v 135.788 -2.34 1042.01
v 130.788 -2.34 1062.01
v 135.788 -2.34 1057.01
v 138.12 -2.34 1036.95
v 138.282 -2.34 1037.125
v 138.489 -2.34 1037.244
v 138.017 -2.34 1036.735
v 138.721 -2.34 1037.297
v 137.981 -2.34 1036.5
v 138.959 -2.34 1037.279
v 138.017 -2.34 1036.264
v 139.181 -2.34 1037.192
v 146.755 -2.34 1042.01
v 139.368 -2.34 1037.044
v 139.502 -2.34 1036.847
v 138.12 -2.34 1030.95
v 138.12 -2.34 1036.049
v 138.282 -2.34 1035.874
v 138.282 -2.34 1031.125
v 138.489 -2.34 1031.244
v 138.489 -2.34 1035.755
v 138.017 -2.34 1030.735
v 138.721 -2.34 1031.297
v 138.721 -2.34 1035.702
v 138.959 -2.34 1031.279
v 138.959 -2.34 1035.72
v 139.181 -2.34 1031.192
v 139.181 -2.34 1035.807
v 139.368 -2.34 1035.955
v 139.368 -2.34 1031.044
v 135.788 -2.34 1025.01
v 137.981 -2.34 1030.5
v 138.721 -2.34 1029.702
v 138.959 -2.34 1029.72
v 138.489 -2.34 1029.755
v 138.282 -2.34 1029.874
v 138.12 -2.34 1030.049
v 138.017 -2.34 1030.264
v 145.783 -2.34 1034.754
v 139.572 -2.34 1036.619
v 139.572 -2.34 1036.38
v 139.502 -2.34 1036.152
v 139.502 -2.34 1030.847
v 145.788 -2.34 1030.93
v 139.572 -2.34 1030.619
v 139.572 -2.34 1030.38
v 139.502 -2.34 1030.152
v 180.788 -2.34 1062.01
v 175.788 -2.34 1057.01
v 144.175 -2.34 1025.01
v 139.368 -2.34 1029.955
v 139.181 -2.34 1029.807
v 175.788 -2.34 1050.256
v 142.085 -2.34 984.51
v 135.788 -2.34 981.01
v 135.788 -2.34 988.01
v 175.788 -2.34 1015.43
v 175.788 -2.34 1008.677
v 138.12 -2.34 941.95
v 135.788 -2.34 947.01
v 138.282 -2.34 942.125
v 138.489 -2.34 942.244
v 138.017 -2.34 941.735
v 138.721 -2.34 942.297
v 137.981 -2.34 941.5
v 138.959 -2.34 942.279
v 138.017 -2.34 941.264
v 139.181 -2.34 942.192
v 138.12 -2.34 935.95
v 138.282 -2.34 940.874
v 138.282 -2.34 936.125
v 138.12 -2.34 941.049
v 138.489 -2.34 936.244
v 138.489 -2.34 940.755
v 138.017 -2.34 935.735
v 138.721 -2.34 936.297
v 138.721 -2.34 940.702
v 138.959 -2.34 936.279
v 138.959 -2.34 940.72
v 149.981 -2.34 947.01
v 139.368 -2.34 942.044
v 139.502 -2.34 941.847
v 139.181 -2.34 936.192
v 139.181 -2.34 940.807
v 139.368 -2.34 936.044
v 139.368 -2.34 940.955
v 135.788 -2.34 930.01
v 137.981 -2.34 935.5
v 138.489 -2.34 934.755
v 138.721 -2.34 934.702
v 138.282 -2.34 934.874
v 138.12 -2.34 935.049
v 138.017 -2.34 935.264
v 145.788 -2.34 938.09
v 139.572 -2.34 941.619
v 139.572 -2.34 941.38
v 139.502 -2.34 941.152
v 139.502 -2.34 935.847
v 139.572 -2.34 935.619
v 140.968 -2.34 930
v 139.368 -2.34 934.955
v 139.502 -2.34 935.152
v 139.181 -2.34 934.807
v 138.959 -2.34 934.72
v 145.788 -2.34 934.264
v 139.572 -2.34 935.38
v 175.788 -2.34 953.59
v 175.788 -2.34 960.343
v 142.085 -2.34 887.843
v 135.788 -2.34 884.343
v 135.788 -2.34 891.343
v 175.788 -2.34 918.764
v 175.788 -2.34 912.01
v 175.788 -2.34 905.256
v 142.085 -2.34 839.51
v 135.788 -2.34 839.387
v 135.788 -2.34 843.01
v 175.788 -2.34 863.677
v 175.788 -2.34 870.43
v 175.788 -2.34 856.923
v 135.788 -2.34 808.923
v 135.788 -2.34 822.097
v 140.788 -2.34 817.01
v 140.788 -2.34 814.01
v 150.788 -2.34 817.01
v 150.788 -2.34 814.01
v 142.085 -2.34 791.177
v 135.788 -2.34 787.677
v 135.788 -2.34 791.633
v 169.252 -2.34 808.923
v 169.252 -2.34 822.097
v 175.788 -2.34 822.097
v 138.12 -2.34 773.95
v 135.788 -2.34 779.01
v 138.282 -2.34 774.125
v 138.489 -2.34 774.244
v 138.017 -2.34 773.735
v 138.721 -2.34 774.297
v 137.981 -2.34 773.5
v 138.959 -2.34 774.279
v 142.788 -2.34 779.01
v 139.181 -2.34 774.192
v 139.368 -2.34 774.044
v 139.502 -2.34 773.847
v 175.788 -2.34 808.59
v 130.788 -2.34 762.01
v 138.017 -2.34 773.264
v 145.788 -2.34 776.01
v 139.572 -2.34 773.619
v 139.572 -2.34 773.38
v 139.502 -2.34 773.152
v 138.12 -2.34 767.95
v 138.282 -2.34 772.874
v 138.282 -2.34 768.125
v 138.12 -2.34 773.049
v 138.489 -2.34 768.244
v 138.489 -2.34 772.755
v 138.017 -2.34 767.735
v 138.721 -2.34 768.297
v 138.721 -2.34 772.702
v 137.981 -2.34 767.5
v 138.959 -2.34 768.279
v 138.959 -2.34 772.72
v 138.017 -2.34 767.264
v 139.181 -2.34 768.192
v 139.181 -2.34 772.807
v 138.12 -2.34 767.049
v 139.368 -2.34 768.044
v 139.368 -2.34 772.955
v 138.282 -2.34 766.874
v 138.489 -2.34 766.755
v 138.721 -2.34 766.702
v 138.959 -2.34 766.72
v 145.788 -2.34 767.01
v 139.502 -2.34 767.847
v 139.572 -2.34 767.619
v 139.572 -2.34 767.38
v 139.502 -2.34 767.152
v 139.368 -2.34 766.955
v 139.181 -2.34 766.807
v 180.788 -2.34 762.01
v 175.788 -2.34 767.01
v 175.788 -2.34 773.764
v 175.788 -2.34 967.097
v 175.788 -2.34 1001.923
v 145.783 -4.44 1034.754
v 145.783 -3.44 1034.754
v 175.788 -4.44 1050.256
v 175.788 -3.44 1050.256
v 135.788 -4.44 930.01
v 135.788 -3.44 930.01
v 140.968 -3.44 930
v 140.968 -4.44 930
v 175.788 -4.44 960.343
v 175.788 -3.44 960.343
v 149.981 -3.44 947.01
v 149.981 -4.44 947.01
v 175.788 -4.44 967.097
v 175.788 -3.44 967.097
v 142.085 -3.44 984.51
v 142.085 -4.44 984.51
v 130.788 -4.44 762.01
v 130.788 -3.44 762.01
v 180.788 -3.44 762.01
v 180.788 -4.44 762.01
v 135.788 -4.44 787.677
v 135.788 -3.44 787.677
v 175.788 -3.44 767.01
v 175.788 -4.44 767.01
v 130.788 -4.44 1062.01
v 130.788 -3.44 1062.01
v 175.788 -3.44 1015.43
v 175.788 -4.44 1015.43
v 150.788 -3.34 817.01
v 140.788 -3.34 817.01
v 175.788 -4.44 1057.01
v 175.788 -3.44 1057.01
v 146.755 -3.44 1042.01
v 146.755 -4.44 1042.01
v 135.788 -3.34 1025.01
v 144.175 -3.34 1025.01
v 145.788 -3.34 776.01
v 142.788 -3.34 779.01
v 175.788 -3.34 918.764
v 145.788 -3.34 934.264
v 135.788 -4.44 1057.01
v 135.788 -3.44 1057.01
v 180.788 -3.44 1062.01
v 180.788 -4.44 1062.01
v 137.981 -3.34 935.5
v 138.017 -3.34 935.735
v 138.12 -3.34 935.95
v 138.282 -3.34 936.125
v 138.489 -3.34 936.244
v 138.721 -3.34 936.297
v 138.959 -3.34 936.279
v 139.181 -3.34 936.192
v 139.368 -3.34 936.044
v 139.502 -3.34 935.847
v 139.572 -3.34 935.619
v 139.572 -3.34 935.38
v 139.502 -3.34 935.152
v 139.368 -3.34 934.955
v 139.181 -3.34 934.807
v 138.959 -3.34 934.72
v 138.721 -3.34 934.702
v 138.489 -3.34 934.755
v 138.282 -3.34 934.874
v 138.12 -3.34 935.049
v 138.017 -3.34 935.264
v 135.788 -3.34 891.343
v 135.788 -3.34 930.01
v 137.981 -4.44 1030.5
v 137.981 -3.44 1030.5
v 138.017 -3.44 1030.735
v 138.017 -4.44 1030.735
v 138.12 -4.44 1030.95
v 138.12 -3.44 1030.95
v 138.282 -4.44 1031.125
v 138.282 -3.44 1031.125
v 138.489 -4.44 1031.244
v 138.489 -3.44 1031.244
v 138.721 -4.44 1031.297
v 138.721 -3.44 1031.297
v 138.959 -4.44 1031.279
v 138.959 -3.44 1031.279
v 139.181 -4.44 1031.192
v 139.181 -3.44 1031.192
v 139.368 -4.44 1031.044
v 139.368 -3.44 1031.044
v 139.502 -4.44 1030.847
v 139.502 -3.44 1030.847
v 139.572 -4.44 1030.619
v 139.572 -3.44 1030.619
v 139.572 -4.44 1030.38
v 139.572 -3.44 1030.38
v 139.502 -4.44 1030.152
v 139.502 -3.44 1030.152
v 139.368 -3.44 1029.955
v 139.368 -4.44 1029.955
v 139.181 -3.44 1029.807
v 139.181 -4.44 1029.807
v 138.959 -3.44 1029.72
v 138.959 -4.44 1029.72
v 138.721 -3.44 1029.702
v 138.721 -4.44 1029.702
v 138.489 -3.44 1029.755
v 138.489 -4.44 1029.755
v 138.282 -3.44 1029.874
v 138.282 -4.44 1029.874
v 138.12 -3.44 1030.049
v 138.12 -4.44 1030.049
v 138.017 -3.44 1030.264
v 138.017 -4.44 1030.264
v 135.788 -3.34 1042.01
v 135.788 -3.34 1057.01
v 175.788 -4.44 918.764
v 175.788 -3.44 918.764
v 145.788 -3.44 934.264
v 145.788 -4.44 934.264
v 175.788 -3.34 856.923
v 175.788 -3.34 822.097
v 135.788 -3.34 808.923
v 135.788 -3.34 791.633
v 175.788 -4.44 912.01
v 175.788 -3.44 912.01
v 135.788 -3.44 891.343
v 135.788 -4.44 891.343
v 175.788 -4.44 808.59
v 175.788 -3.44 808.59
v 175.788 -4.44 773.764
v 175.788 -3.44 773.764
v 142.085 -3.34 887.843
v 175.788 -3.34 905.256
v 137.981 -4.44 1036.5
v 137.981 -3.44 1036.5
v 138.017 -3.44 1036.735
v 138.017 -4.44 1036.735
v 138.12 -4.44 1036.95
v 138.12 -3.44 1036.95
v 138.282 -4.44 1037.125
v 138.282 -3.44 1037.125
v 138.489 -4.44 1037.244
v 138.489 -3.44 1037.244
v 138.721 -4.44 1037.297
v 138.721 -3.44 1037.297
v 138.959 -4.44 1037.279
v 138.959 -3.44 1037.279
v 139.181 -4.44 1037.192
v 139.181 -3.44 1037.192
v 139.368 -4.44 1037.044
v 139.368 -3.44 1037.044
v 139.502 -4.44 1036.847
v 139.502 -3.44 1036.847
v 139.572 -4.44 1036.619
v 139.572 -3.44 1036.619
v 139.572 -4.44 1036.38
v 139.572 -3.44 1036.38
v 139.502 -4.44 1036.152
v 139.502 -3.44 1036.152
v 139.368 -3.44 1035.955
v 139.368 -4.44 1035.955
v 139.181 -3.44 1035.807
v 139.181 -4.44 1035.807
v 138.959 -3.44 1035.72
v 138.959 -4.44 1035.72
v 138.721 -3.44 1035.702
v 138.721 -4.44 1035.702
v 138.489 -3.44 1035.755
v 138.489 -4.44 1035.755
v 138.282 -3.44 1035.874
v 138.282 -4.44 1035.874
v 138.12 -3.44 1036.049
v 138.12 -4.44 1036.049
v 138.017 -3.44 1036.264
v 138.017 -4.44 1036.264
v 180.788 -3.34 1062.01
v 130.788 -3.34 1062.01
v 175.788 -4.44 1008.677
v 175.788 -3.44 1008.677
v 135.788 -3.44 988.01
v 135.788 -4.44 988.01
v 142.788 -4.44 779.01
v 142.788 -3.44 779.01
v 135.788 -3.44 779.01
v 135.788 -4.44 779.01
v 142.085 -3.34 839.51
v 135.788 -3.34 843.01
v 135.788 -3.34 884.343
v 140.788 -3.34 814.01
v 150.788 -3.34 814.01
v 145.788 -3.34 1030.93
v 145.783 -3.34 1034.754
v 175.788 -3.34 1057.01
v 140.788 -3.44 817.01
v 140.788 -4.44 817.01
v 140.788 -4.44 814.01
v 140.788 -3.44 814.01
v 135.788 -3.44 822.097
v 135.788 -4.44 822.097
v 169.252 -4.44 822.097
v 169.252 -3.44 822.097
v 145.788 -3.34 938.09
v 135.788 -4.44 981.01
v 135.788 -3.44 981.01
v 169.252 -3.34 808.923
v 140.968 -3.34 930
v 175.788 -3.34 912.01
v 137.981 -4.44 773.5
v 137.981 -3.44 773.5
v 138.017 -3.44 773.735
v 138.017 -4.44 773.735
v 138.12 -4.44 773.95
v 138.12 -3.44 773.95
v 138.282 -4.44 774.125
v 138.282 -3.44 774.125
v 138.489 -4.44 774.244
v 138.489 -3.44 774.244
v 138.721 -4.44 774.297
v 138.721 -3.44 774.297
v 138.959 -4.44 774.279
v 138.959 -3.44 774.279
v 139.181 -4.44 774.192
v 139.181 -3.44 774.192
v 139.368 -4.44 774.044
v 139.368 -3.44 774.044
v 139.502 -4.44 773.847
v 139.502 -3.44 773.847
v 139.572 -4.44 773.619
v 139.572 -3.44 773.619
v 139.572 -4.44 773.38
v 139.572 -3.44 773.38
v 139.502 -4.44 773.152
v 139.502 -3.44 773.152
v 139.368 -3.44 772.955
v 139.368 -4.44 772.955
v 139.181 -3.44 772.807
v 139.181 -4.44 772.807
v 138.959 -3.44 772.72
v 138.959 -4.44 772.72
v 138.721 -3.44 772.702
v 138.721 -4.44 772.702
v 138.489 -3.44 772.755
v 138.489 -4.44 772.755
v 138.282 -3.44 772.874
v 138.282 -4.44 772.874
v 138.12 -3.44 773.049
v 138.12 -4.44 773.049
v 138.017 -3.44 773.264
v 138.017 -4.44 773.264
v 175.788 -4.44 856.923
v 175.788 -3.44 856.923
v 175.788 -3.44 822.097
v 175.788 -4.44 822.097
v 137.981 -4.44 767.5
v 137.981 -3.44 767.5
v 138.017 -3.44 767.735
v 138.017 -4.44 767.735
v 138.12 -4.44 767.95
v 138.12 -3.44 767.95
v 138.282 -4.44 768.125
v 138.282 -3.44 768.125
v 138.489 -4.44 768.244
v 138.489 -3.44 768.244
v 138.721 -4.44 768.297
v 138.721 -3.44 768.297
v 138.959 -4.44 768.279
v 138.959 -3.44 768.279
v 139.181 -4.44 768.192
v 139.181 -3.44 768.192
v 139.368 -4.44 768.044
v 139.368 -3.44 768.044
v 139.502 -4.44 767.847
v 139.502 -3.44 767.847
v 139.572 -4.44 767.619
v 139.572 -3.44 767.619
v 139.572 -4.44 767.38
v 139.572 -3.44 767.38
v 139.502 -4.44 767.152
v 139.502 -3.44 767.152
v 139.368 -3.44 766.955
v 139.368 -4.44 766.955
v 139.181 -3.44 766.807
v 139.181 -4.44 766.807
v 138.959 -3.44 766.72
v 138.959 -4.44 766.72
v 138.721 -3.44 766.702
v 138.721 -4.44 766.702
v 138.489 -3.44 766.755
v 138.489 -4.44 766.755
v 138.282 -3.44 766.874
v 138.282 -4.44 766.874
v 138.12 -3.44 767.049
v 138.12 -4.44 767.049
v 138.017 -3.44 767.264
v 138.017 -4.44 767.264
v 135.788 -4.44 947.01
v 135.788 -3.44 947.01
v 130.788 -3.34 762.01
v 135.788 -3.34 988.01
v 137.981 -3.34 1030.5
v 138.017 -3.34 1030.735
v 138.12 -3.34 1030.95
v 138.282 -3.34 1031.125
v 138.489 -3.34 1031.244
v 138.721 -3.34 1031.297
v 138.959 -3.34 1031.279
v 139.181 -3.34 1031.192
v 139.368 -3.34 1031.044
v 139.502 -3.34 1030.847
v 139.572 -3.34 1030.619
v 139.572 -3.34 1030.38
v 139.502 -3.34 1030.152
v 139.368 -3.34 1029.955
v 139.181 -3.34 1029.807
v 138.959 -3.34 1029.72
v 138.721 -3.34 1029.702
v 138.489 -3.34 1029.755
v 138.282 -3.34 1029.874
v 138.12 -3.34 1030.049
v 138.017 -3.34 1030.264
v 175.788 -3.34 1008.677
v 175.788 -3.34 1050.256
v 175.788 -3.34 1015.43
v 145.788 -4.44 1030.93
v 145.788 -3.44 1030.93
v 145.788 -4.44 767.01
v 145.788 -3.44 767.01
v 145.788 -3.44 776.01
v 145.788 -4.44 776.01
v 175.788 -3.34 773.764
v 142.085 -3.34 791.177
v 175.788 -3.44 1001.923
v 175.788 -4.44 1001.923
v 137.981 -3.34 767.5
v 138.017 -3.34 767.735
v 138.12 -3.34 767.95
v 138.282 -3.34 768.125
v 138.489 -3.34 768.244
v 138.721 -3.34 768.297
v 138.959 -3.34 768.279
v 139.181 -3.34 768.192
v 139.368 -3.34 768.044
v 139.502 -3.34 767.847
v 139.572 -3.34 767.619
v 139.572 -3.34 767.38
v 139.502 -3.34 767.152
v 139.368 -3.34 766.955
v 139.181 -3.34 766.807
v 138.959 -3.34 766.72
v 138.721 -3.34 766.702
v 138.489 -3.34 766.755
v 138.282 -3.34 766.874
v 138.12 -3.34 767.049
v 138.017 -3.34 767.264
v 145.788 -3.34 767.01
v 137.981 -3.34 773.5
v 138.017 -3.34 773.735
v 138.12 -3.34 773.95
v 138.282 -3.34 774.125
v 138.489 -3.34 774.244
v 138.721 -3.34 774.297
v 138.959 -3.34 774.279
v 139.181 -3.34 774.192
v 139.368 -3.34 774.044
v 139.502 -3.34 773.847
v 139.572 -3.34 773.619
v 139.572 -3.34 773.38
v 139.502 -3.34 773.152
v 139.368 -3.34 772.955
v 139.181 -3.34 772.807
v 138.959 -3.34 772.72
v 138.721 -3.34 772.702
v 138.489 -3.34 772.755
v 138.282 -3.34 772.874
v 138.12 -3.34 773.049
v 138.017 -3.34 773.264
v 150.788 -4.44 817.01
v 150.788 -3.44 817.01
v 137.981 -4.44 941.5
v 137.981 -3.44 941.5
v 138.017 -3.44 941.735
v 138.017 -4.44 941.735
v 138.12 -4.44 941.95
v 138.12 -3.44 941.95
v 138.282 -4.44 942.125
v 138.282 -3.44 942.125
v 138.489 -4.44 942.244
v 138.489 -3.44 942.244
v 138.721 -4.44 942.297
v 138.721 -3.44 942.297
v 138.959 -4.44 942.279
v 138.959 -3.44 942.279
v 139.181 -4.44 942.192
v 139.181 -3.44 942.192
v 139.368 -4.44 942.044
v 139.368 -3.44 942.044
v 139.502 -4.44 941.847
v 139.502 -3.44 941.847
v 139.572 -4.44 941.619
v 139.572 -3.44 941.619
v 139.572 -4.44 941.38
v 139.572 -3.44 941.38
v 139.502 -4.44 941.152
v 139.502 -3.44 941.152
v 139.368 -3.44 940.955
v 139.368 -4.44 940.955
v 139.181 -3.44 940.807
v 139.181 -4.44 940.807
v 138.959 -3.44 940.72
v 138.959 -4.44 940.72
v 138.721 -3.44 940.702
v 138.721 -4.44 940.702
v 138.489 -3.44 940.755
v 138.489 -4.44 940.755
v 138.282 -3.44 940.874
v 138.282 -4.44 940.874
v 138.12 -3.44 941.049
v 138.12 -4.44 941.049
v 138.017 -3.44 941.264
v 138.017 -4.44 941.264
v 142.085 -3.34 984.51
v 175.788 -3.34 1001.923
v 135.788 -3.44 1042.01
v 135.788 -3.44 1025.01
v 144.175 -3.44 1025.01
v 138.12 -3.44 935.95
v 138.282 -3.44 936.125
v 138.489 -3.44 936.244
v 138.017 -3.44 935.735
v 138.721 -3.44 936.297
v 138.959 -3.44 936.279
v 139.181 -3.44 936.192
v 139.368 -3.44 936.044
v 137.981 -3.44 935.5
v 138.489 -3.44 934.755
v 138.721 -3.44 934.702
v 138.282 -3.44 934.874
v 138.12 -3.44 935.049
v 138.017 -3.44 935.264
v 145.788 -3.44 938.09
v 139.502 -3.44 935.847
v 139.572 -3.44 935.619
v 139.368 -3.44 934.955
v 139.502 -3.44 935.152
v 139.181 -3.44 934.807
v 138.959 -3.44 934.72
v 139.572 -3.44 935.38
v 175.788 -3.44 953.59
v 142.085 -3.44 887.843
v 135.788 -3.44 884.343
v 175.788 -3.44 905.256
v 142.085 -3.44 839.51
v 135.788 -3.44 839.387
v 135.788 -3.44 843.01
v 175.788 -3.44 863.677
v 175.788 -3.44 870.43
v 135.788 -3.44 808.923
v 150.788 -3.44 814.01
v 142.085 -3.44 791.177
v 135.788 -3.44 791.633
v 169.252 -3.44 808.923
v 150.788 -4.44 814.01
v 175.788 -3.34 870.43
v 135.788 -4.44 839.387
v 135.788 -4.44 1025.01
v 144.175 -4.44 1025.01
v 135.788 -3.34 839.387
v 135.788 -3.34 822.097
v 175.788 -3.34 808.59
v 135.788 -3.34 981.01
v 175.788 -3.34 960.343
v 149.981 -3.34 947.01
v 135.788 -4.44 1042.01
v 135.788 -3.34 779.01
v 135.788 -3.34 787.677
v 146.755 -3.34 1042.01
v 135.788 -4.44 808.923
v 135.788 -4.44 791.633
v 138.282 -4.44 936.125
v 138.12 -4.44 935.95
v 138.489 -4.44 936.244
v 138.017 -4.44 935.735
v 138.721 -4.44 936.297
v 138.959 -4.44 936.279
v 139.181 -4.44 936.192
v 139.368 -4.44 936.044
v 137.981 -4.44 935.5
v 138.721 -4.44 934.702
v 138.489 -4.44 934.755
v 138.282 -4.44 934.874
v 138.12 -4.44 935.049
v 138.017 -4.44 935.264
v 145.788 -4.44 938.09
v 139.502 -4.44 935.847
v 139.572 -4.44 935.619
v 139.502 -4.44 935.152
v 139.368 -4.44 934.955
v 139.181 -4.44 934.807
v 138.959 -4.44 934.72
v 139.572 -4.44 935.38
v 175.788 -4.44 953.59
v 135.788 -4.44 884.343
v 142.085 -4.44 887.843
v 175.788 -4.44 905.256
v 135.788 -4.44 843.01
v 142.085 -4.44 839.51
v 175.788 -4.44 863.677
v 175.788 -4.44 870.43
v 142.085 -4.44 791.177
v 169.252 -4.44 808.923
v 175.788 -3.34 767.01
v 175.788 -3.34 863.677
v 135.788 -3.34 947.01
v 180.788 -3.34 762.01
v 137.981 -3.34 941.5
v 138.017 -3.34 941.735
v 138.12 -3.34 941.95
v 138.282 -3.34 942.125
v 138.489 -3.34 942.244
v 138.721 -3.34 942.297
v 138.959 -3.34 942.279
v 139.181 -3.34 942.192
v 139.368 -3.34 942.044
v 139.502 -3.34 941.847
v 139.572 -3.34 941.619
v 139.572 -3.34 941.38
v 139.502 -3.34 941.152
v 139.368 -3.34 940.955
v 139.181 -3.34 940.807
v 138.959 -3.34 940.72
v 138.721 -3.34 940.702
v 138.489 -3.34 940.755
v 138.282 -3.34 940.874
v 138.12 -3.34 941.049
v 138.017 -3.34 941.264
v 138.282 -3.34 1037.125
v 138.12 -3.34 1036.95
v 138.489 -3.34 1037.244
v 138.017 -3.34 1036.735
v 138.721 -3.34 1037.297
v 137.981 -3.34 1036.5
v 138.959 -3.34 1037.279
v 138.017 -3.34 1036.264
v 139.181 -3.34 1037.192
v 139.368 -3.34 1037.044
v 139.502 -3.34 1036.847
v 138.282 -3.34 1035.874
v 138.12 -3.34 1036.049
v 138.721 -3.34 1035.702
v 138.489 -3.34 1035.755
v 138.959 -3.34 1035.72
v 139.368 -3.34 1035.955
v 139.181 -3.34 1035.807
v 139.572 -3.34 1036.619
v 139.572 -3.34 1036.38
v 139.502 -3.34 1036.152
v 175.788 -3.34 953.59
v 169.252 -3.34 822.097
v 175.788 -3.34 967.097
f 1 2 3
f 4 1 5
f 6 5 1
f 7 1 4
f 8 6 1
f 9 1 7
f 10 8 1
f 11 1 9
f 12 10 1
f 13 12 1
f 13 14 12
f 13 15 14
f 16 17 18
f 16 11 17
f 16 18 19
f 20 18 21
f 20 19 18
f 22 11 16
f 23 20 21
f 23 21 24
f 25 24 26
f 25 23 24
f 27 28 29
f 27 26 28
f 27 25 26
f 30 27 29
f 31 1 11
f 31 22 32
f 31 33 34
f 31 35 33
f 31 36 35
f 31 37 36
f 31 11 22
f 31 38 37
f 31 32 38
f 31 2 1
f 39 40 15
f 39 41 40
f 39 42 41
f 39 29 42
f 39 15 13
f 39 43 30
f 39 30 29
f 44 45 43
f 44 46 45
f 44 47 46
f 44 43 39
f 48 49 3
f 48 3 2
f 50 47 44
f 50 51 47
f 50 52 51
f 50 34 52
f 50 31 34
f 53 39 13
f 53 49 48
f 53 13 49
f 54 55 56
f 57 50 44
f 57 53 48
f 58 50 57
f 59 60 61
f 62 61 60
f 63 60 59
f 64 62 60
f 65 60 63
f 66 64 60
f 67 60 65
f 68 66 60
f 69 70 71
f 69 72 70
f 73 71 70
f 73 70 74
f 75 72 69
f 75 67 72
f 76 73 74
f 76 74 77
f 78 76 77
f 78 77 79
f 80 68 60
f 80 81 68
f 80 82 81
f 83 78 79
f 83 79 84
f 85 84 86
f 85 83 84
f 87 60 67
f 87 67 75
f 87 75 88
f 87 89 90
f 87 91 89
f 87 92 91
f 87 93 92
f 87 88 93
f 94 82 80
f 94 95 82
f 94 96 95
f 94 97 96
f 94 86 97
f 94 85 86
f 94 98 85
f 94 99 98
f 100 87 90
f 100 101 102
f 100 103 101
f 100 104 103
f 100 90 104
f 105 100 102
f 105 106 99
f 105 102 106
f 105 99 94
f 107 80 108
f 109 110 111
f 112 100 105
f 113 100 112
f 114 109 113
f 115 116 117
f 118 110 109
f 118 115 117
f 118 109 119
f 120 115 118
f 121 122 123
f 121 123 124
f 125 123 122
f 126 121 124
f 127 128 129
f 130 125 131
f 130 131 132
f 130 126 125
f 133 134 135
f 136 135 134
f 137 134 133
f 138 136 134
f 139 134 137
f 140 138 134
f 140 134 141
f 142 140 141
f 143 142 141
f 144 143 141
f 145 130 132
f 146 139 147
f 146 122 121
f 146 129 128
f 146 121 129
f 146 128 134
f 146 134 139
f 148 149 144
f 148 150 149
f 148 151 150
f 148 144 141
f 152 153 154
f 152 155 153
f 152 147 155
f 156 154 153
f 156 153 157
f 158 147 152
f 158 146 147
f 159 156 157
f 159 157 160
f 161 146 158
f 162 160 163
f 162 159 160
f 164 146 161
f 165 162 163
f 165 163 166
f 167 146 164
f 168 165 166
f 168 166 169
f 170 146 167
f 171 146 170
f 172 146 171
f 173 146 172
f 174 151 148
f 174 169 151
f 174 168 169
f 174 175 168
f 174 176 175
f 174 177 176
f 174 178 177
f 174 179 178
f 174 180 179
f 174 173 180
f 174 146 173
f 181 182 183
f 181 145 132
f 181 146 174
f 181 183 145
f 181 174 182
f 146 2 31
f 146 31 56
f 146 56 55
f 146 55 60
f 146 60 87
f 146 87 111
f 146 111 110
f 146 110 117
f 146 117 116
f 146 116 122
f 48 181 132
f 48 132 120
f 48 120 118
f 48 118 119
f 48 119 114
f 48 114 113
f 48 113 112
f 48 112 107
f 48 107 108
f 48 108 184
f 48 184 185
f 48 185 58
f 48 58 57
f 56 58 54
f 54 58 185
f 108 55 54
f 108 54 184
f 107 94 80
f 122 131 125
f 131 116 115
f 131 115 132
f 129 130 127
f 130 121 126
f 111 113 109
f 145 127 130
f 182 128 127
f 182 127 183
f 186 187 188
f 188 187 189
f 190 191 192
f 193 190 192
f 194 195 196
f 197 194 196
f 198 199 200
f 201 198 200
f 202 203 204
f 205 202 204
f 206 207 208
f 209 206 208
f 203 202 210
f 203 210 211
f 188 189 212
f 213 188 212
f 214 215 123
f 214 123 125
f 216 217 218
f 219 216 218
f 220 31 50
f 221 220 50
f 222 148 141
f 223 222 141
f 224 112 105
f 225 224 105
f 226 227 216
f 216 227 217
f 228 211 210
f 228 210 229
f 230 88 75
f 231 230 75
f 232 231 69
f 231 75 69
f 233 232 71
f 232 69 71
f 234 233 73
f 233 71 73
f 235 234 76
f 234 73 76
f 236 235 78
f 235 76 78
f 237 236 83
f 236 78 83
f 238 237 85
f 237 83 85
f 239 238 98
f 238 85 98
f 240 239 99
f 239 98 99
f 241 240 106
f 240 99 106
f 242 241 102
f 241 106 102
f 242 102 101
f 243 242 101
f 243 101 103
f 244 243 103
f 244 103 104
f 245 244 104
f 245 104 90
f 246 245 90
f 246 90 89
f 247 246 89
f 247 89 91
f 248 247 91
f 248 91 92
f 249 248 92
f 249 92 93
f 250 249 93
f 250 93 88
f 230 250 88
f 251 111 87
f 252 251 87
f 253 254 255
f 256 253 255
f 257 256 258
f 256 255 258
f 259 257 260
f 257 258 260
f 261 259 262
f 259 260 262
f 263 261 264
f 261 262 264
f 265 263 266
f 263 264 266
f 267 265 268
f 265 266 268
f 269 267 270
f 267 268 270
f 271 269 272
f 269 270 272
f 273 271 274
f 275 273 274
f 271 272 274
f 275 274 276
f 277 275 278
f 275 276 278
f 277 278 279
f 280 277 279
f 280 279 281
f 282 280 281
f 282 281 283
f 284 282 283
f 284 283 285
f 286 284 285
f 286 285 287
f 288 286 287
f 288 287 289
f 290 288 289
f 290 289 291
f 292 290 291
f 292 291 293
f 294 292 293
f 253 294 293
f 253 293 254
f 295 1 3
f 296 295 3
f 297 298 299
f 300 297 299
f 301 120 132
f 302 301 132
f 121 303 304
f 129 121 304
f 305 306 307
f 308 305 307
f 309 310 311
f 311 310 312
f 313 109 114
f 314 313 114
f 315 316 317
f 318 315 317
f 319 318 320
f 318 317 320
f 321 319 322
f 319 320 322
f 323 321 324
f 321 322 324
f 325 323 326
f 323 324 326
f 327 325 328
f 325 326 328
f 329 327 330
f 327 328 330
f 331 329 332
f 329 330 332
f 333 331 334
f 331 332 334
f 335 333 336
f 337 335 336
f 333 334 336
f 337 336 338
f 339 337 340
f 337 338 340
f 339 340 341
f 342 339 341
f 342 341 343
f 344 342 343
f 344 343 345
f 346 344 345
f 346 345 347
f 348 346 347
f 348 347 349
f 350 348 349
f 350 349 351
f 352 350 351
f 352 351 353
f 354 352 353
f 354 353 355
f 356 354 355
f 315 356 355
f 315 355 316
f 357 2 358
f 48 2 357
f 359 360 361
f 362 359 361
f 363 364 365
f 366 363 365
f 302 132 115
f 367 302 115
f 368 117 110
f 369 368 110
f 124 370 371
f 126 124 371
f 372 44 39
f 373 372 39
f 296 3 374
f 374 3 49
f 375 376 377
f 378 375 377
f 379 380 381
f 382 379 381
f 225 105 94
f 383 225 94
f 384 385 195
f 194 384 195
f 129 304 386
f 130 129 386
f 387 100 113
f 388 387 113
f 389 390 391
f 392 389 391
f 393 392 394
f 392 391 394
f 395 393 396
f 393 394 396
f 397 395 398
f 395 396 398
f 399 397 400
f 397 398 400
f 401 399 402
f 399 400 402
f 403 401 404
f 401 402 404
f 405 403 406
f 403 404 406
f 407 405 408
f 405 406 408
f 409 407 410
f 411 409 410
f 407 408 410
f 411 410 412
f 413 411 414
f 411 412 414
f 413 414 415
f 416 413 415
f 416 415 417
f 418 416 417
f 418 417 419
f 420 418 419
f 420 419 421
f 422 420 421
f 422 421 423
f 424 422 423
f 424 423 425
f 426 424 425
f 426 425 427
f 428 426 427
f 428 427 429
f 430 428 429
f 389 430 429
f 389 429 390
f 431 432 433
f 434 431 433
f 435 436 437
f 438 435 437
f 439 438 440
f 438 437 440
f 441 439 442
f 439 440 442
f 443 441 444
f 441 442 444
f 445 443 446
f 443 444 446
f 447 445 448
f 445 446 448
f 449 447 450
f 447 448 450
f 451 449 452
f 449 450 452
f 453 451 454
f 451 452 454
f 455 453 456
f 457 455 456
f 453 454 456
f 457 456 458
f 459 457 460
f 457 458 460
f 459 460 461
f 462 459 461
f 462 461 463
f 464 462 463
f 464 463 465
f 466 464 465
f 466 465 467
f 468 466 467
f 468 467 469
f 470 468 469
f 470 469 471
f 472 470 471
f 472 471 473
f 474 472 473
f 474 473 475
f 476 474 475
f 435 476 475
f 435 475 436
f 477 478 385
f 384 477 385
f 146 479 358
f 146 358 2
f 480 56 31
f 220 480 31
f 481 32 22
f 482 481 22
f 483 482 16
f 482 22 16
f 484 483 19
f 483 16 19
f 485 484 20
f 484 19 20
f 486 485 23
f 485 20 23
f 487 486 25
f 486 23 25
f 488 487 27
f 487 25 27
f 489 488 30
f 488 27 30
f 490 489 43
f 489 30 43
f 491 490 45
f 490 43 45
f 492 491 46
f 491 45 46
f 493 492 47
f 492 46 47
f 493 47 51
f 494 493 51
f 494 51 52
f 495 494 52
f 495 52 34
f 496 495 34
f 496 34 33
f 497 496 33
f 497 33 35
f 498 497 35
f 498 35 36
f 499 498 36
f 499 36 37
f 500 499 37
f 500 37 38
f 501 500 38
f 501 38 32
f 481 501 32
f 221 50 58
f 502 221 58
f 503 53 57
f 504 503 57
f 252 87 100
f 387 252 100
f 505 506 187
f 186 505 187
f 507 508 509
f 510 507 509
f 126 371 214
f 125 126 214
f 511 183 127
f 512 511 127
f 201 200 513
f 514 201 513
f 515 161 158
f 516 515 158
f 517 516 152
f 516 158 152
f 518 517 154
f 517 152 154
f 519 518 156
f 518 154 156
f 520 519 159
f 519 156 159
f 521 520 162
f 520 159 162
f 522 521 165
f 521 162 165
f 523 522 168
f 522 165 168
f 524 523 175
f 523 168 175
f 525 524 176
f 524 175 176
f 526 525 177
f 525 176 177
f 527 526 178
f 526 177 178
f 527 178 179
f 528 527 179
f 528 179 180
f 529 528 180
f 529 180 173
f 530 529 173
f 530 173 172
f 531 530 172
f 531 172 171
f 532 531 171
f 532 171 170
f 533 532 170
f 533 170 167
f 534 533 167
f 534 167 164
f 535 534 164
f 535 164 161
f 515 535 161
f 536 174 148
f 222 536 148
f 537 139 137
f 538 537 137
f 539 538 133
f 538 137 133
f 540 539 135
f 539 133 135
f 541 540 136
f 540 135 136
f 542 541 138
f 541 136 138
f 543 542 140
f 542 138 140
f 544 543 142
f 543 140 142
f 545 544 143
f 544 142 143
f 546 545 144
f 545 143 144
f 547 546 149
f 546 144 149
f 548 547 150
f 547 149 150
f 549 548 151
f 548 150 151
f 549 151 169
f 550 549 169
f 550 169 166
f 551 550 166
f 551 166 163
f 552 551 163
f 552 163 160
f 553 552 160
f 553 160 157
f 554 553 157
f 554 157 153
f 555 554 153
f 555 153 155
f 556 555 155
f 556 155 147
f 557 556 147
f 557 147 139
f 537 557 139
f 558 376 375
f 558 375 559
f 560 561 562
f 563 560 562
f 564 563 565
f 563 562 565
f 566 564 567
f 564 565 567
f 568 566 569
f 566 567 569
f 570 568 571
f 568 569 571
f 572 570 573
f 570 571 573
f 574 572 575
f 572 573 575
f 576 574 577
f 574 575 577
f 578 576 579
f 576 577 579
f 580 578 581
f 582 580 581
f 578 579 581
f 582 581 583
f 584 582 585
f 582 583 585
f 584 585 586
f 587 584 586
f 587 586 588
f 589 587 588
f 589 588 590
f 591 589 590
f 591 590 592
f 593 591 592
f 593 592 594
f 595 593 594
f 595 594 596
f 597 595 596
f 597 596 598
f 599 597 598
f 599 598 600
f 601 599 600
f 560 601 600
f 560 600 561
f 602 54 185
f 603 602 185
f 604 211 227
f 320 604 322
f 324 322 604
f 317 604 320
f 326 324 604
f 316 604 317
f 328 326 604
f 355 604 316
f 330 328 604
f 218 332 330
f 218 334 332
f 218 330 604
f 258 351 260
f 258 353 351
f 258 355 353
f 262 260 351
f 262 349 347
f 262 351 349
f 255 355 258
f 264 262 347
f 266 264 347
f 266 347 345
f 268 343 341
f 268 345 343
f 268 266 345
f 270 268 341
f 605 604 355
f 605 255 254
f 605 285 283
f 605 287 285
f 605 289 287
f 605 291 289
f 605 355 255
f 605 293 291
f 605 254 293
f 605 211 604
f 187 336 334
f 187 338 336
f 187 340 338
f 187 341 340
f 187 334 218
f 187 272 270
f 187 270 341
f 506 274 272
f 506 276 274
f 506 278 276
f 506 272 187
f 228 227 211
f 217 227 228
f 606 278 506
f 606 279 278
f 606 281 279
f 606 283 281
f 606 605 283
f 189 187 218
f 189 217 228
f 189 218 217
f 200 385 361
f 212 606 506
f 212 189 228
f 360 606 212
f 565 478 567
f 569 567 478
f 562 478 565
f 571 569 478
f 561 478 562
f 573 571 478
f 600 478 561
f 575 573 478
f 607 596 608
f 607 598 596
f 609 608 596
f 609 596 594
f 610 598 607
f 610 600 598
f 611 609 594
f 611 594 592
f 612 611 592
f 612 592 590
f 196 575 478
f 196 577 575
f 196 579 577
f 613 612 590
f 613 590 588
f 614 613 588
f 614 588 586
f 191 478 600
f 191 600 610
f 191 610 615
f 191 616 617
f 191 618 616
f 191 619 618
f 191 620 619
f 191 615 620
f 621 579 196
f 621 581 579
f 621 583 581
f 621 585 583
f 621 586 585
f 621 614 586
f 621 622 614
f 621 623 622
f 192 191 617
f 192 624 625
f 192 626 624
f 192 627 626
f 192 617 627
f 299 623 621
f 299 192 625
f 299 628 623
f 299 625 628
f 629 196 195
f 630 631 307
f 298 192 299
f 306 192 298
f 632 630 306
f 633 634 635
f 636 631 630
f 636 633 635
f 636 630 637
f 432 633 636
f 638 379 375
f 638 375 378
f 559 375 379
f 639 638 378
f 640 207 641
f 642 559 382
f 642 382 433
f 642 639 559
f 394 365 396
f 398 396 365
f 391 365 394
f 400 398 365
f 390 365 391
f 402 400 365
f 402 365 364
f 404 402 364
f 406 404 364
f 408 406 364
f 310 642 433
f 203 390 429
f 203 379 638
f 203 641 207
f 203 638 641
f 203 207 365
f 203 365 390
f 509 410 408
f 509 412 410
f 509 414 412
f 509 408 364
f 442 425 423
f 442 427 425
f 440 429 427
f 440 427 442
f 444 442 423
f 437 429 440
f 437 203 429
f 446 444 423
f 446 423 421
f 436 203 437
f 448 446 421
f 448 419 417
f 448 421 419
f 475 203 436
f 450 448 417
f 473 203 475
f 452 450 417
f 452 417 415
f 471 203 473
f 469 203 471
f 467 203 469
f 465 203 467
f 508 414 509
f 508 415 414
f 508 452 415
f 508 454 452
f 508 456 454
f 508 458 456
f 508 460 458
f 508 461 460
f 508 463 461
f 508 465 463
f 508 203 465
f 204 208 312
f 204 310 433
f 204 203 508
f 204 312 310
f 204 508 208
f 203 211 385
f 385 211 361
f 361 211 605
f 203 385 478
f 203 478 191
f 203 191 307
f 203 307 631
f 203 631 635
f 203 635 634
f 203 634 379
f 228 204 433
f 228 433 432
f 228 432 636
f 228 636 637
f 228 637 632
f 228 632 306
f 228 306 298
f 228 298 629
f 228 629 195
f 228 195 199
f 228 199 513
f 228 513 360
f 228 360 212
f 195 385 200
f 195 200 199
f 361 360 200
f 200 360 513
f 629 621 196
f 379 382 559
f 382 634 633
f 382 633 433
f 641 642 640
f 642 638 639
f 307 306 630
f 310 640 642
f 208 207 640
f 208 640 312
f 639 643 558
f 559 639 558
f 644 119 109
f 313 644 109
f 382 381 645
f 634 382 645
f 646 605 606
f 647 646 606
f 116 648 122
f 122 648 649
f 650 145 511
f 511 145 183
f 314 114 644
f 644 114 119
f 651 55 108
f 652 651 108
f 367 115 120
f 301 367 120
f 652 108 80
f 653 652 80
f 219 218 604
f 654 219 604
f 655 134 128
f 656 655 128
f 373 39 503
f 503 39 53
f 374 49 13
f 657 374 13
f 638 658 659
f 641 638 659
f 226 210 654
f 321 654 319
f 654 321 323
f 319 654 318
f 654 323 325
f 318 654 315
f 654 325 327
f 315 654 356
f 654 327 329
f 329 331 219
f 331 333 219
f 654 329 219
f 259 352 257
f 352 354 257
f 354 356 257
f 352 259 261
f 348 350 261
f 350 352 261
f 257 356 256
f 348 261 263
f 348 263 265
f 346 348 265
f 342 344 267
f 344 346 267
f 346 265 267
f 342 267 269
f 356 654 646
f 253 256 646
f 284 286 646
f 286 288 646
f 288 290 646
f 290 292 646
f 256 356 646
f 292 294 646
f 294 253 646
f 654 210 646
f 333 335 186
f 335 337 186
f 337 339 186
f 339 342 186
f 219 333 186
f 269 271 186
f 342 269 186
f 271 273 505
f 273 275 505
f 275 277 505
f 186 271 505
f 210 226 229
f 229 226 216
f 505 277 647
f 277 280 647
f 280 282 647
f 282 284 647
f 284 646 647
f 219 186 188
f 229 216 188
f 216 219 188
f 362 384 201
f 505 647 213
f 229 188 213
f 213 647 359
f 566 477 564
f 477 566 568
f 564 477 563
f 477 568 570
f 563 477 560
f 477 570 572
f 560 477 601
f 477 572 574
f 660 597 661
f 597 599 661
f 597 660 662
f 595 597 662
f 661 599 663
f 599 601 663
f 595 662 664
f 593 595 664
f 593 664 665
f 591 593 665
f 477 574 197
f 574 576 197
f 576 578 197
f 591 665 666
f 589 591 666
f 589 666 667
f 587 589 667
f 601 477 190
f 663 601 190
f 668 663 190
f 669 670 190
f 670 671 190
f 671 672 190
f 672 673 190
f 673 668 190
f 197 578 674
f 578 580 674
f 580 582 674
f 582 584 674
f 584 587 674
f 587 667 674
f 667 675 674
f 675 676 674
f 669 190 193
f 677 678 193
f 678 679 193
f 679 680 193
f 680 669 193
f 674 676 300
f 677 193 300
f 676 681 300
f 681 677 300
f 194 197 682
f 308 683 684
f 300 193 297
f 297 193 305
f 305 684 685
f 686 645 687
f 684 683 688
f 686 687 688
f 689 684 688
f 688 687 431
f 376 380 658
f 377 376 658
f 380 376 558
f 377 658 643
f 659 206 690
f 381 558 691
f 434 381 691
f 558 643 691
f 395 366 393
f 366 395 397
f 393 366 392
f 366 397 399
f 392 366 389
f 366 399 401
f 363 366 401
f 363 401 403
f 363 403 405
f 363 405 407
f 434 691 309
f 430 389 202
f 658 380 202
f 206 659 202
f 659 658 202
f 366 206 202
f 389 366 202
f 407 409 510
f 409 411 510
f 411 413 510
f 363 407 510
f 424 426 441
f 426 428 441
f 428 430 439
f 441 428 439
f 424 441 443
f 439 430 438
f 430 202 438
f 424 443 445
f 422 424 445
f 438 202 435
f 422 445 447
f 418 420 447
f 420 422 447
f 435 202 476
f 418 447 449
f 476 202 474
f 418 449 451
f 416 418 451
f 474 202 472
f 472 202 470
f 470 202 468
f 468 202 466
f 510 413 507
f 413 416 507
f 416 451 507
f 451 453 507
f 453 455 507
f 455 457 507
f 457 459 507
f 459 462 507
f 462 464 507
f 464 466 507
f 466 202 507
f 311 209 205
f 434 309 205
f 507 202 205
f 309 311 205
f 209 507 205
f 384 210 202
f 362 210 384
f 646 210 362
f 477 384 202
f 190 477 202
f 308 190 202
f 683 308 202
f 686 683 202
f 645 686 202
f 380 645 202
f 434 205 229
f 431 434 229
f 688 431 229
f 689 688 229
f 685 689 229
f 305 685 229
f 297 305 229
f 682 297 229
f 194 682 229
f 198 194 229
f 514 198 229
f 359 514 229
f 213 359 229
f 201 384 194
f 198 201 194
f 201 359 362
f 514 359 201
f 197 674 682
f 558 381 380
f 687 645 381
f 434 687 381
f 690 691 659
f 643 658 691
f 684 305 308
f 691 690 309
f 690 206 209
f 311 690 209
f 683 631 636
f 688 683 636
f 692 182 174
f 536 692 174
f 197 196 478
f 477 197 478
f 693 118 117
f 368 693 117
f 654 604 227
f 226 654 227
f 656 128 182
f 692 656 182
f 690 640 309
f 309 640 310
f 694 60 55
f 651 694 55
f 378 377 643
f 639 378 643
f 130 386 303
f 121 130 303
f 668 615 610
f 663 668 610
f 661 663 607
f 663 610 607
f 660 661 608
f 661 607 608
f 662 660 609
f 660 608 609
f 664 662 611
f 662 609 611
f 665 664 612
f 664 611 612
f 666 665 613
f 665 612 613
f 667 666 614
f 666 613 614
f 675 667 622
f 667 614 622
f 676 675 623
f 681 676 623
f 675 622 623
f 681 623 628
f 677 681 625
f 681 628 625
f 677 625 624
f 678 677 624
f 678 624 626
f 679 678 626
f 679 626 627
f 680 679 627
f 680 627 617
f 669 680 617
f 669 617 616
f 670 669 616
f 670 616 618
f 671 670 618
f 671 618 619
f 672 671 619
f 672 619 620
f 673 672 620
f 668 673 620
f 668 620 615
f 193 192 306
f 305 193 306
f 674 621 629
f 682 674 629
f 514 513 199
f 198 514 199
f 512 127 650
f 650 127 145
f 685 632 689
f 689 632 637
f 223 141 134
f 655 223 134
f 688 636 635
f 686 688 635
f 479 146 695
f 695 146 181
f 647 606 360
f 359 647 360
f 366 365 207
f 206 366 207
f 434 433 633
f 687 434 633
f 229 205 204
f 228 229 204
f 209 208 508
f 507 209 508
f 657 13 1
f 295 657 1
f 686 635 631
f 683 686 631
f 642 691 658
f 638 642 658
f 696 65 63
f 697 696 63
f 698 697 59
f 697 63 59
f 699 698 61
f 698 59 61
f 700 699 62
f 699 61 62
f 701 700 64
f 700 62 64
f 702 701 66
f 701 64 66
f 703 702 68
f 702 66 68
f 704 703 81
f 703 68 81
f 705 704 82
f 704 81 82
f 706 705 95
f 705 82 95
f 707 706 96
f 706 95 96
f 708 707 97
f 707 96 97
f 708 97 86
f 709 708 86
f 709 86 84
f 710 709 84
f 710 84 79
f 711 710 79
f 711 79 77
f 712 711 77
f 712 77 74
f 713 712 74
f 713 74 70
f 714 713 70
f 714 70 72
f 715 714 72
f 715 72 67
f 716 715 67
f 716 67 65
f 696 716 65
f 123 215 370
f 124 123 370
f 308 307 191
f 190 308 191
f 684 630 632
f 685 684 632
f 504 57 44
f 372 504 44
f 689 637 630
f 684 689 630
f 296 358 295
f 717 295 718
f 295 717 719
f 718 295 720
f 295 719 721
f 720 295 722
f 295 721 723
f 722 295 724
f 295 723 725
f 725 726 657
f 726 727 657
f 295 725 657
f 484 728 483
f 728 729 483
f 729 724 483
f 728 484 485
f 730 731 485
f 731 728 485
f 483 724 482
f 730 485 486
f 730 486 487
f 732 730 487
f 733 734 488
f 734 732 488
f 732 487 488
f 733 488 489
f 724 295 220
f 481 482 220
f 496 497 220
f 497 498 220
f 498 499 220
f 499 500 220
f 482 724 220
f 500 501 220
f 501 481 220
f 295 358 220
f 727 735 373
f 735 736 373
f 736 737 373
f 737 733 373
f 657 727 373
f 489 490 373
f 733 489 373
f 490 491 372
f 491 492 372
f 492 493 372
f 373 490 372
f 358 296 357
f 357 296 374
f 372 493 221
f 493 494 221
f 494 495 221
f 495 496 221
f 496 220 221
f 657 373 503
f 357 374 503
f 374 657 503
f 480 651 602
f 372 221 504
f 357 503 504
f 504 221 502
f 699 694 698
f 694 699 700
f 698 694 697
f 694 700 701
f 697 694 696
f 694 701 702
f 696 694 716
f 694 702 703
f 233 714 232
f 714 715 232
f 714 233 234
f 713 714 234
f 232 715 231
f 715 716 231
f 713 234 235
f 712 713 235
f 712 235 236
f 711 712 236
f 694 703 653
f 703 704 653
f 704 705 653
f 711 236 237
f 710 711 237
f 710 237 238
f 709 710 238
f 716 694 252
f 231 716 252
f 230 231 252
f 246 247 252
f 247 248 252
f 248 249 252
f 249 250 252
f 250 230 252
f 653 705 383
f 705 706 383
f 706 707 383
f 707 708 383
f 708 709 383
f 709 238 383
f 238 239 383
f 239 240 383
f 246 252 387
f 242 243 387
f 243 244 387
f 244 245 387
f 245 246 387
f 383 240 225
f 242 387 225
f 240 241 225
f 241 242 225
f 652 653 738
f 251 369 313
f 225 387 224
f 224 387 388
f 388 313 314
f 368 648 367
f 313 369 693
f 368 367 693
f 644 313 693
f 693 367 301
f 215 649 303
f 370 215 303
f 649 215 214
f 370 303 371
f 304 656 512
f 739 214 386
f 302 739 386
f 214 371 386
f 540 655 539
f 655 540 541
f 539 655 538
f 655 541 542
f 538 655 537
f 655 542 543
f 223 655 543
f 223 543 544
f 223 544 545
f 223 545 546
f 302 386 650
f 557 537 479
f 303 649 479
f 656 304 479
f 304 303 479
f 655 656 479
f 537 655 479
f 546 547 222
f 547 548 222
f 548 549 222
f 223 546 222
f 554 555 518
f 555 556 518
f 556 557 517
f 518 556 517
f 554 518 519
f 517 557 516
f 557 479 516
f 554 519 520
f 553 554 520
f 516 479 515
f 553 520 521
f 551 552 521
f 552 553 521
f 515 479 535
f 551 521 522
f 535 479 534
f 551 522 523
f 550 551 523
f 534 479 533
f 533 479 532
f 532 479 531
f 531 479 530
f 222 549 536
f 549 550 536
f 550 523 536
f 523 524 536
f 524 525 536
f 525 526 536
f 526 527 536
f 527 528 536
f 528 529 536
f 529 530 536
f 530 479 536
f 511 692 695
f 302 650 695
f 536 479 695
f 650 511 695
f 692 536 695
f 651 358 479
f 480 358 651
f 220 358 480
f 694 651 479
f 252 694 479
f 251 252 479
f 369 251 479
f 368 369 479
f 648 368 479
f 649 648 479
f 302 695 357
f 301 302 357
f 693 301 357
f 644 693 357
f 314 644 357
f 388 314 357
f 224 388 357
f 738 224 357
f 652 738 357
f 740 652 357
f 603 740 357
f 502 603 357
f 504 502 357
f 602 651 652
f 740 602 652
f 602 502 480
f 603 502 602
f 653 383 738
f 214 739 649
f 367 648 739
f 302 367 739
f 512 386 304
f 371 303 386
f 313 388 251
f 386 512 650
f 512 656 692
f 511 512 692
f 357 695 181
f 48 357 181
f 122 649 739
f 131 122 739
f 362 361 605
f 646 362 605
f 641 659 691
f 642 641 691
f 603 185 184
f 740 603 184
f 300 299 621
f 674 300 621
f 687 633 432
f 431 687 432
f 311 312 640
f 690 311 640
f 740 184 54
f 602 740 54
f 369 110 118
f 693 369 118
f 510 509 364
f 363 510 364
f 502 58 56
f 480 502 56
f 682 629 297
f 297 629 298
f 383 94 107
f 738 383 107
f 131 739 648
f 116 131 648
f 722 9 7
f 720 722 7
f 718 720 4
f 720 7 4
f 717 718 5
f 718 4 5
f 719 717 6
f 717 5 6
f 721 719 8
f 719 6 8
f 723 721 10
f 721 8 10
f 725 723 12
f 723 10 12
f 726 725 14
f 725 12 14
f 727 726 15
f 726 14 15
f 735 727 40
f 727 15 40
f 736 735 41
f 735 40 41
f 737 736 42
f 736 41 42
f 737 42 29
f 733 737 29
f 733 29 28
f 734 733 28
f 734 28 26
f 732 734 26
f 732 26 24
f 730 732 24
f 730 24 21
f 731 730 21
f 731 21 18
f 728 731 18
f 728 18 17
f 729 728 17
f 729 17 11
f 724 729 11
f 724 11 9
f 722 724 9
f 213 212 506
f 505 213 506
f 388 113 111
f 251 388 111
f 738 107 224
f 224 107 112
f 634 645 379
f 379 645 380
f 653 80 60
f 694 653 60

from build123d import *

# Parameters (mm, degrees)
SKETCH_2_W          = 50
SKETCH_2_H          = 1
EXTRUDE_1_DEPTH     = 300
EXTRUDE_1_2_DEPTH   = 300
CUT_EXTRUDE_1_DEPTH = 1078.290028257
SKETCH_4_W          = 10
SKETCH_4_H          = 1.5
CUT_EXTRUDE_2_DEPTH = 10
SKETCH_5_R          = 0.8
CUT_EXTRUDE_3_DEPTH = 1078.290028257


with BuildPart() as part:
    # 草图2 → 凸台-拉伸1 (new body)
    with BuildSketch(Plane.XY.offset(762.01)):
        with Locations((155.787596038, -2.839694097)):
            Rectangle(SKETCH_2_W, SKETCH_2_H)
    extrude(amount=EXTRUDE_1_DEPTH)


with BuildPart() as body_2:
    # 草图2 → Extrude 1 2 (new body)
    with BuildSketch(Plane.XY.offset(762.01)):
        with Locations((155.787596038, -3.939694097)):
            Rectangle(SKETCH_2_W, SKETCH_2_H)
    extrude(amount=EXTRUDE_1_2_DEPTH)


with BuildPart() as cut_extrude_1_tool:
    # 草图3 → 切除-拉伸1 (new, through all)
    with BuildSketch(Plane(origin=(0, -2.339694097, 0), x_dir=(1, 0, 0), z_dir=(0, 1, 0))):
        Polygon((135.787596038, -1057.01), (175.787596038, -1057.01), (146.755337973, -1042.01), (135.787596038, -1042.01), align=None)
        Polygon((145.783189251, -1034.754205558), (175.787596038, -1050.256482398), (175.787596038, -1015.430184269), (145.787596038, -1030.930184269), align=None)
        Polygon((144.174692812, -1025.01), (175.787596038, -1008.676666667), (135.787596038, -988.01), (135.787596038, -1025.01), align=None)
        Polygon((142.08472688, -984.51), (175.787596038, -1001.923149065), (175.787596038, -967.096850935), align=None)
        Polygon((135.787596038, -947.01), (135.787596038, -981.01), (175.787596038, -960.343333333), (149.981144425, -947.01), align=None)
        Polygon((145.787596038, -938.089815731), (175.787596038, -953.589815731), (175.787596038, -918.763517602), (145.787596038, -934.263517602), align=None)
        Polygon((140.968302675, -929.999968238), (175.787596038, -912.01), (135.787596038, -891.343333333), (135.787596038, -930.01), align=None)
        Polygon((142.08472688, -887.843333333), (175.787596038, -905.256482398), (175.787596038, -870.430184269), align=None)
        Polygon((135.787596038, -843.01), (135.787596038, -884.343333333), (175.787596038, -863.676666667), align=None)
        Polygon((142.08472688, -839.51), (175.787596038, -856.923149065), (175.787596038, -822.096850935), align=None)
        Polygon((135.787596038, -779.01), (135.787596038, -787.676666667), (175.787596038, -767.01), (145.787596038, -767.01), (145.787596038, -776.01), (142.787596038, -779.01), align=None)
        Polygon((142.08472688, -791.176666667), (175.787596038, -808.589815731), (175.787596038, -773.763517602), align=None)
    extrude(amount=-CUT_EXTRUDE_1_DEPTH)


with BuildPart() as part_1:
    add(part.part)

    # 切除-拉伸1: cut by cut_extrude_1_tool
    add(cut_extrude_1_tool.part, mode=Mode.SUBTRACT)


with BuildPart() as body_2_1:
    add(body_2.part)

    # 切除-拉伸1: cut by cut_extrude_1_tool
    add(cut_extrude_1_tool.part, mode=Mode.SUBTRACT)


with BuildPart() as cut_extrude_2_tool:
    # 草图4 → 切除-拉伸2 (new body)
    with BuildSketch(Plane.XZ.offset(4.439694097)):
        with Locations((145.787596038, 814.76)):
            Rectangle(SKETCH_4_W, SKETCH_4_H)
        with Locations((145.787596038, 816.26)):
            Rectangle(SKETCH_4_W, SKETCH_4_H)
        Polygon((135.787596038, 791.633241199), (169.251933842, 808.923149065), (135.787596038, 808.923149065), align=None)
        Polygon((135.787596038, 822.096850935), (169.251933842, 822.096850935), (135.787596038, 839.386758801), align=None)
    extrude(amount=-CUT_EXTRUDE_2_DEPTH)


with BuildPart() as part_2:
    add(part_1.part)

    # 切除-拉伸2: cut by cut_extrude_2_tool
    add(cut_extrude_2_tool.part, mode=Mode.SUBTRACT)


with BuildPart() as body_2_2:
    add(body_2_1.part)

    # 切除-拉伸2: cut by cut_extrude_2_tool
    add(cut_extrude_2_tool.part, mode=Mode.SUBTRACT)


with BuildPart() as cut_extrude_3_tool:
    # 草图5 → 切除-拉伸3 (new, through all)
    with BuildSketch(Plane(origin=(0, -2.339694097, 0), x_dir=(1, 0, 0), z_dir=(0, 1, 0))):
        with Locations(Location((138.781173313, -1036.499517206, 0), (0, 0, 180))):
            Circle(SKETCH_5_R)
        with Locations((124.781173313, -1036.499517206)):
            Circle(SKETCH_5_R)
        with Locations((124.781173313, -1030.499517206)):
            Circle(SKETCH_5_R)
        with Locations(Location((138.781173313, -1030.499517206, 0), (0, 0, 180))):
            Circle(SKETCH_5_R)
        with Locations((124.781173313, -935.499517206)):
            Circle(SKETCH_5_R)
        with Locations(Location((138.781173313, -935.499517206, 0), (0, 0, 180))):
            Circle(SKETCH_5_R)
        with Locations(Location((138.781173313, -941.499517206, 0), (0, 0, 180))):
            Circle(SKETCH_5_R)
        with Locations((124.781173313, -941.499517206)):
            Circle(SKETCH_5_R)
        with Locations((124.781173313, -767.499517206)):
            Circle(SKETCH_5_R)
        with Locations(Location((138.781173313, -767.499517206, 0), (0, 0, 180))):
            Circle(SKETCH_5_R)
        with Locations(Location((138.781173313, -773.499517206, 0), (0, 0, 180))):
            Circle(SKETCH_5_R)
        with Locations((124.781173313, -773.499517206)):
            Circle(SKETCH_5_R)
    extrude(amount=-CUT_EXTRUDE_3_DEPTH)


with BuildPart() as part_3:
    add(part_2.part)

    # 切除-拉伸3: cut by cut_extrude_3_tool
    add(cut_extrude_3_tool.part, mode=Mode.SUBTRACT)


with BuildPart() as body_2_3:
    add(body_2_2.part)

    # 切除-拉伸3: cut by cut_extrude_3_tool
    add(cut_extrude_3_tool.part, mode=Mode.SUBTRACT)


solid = Compound([part_3.part, body_2_3.part])
